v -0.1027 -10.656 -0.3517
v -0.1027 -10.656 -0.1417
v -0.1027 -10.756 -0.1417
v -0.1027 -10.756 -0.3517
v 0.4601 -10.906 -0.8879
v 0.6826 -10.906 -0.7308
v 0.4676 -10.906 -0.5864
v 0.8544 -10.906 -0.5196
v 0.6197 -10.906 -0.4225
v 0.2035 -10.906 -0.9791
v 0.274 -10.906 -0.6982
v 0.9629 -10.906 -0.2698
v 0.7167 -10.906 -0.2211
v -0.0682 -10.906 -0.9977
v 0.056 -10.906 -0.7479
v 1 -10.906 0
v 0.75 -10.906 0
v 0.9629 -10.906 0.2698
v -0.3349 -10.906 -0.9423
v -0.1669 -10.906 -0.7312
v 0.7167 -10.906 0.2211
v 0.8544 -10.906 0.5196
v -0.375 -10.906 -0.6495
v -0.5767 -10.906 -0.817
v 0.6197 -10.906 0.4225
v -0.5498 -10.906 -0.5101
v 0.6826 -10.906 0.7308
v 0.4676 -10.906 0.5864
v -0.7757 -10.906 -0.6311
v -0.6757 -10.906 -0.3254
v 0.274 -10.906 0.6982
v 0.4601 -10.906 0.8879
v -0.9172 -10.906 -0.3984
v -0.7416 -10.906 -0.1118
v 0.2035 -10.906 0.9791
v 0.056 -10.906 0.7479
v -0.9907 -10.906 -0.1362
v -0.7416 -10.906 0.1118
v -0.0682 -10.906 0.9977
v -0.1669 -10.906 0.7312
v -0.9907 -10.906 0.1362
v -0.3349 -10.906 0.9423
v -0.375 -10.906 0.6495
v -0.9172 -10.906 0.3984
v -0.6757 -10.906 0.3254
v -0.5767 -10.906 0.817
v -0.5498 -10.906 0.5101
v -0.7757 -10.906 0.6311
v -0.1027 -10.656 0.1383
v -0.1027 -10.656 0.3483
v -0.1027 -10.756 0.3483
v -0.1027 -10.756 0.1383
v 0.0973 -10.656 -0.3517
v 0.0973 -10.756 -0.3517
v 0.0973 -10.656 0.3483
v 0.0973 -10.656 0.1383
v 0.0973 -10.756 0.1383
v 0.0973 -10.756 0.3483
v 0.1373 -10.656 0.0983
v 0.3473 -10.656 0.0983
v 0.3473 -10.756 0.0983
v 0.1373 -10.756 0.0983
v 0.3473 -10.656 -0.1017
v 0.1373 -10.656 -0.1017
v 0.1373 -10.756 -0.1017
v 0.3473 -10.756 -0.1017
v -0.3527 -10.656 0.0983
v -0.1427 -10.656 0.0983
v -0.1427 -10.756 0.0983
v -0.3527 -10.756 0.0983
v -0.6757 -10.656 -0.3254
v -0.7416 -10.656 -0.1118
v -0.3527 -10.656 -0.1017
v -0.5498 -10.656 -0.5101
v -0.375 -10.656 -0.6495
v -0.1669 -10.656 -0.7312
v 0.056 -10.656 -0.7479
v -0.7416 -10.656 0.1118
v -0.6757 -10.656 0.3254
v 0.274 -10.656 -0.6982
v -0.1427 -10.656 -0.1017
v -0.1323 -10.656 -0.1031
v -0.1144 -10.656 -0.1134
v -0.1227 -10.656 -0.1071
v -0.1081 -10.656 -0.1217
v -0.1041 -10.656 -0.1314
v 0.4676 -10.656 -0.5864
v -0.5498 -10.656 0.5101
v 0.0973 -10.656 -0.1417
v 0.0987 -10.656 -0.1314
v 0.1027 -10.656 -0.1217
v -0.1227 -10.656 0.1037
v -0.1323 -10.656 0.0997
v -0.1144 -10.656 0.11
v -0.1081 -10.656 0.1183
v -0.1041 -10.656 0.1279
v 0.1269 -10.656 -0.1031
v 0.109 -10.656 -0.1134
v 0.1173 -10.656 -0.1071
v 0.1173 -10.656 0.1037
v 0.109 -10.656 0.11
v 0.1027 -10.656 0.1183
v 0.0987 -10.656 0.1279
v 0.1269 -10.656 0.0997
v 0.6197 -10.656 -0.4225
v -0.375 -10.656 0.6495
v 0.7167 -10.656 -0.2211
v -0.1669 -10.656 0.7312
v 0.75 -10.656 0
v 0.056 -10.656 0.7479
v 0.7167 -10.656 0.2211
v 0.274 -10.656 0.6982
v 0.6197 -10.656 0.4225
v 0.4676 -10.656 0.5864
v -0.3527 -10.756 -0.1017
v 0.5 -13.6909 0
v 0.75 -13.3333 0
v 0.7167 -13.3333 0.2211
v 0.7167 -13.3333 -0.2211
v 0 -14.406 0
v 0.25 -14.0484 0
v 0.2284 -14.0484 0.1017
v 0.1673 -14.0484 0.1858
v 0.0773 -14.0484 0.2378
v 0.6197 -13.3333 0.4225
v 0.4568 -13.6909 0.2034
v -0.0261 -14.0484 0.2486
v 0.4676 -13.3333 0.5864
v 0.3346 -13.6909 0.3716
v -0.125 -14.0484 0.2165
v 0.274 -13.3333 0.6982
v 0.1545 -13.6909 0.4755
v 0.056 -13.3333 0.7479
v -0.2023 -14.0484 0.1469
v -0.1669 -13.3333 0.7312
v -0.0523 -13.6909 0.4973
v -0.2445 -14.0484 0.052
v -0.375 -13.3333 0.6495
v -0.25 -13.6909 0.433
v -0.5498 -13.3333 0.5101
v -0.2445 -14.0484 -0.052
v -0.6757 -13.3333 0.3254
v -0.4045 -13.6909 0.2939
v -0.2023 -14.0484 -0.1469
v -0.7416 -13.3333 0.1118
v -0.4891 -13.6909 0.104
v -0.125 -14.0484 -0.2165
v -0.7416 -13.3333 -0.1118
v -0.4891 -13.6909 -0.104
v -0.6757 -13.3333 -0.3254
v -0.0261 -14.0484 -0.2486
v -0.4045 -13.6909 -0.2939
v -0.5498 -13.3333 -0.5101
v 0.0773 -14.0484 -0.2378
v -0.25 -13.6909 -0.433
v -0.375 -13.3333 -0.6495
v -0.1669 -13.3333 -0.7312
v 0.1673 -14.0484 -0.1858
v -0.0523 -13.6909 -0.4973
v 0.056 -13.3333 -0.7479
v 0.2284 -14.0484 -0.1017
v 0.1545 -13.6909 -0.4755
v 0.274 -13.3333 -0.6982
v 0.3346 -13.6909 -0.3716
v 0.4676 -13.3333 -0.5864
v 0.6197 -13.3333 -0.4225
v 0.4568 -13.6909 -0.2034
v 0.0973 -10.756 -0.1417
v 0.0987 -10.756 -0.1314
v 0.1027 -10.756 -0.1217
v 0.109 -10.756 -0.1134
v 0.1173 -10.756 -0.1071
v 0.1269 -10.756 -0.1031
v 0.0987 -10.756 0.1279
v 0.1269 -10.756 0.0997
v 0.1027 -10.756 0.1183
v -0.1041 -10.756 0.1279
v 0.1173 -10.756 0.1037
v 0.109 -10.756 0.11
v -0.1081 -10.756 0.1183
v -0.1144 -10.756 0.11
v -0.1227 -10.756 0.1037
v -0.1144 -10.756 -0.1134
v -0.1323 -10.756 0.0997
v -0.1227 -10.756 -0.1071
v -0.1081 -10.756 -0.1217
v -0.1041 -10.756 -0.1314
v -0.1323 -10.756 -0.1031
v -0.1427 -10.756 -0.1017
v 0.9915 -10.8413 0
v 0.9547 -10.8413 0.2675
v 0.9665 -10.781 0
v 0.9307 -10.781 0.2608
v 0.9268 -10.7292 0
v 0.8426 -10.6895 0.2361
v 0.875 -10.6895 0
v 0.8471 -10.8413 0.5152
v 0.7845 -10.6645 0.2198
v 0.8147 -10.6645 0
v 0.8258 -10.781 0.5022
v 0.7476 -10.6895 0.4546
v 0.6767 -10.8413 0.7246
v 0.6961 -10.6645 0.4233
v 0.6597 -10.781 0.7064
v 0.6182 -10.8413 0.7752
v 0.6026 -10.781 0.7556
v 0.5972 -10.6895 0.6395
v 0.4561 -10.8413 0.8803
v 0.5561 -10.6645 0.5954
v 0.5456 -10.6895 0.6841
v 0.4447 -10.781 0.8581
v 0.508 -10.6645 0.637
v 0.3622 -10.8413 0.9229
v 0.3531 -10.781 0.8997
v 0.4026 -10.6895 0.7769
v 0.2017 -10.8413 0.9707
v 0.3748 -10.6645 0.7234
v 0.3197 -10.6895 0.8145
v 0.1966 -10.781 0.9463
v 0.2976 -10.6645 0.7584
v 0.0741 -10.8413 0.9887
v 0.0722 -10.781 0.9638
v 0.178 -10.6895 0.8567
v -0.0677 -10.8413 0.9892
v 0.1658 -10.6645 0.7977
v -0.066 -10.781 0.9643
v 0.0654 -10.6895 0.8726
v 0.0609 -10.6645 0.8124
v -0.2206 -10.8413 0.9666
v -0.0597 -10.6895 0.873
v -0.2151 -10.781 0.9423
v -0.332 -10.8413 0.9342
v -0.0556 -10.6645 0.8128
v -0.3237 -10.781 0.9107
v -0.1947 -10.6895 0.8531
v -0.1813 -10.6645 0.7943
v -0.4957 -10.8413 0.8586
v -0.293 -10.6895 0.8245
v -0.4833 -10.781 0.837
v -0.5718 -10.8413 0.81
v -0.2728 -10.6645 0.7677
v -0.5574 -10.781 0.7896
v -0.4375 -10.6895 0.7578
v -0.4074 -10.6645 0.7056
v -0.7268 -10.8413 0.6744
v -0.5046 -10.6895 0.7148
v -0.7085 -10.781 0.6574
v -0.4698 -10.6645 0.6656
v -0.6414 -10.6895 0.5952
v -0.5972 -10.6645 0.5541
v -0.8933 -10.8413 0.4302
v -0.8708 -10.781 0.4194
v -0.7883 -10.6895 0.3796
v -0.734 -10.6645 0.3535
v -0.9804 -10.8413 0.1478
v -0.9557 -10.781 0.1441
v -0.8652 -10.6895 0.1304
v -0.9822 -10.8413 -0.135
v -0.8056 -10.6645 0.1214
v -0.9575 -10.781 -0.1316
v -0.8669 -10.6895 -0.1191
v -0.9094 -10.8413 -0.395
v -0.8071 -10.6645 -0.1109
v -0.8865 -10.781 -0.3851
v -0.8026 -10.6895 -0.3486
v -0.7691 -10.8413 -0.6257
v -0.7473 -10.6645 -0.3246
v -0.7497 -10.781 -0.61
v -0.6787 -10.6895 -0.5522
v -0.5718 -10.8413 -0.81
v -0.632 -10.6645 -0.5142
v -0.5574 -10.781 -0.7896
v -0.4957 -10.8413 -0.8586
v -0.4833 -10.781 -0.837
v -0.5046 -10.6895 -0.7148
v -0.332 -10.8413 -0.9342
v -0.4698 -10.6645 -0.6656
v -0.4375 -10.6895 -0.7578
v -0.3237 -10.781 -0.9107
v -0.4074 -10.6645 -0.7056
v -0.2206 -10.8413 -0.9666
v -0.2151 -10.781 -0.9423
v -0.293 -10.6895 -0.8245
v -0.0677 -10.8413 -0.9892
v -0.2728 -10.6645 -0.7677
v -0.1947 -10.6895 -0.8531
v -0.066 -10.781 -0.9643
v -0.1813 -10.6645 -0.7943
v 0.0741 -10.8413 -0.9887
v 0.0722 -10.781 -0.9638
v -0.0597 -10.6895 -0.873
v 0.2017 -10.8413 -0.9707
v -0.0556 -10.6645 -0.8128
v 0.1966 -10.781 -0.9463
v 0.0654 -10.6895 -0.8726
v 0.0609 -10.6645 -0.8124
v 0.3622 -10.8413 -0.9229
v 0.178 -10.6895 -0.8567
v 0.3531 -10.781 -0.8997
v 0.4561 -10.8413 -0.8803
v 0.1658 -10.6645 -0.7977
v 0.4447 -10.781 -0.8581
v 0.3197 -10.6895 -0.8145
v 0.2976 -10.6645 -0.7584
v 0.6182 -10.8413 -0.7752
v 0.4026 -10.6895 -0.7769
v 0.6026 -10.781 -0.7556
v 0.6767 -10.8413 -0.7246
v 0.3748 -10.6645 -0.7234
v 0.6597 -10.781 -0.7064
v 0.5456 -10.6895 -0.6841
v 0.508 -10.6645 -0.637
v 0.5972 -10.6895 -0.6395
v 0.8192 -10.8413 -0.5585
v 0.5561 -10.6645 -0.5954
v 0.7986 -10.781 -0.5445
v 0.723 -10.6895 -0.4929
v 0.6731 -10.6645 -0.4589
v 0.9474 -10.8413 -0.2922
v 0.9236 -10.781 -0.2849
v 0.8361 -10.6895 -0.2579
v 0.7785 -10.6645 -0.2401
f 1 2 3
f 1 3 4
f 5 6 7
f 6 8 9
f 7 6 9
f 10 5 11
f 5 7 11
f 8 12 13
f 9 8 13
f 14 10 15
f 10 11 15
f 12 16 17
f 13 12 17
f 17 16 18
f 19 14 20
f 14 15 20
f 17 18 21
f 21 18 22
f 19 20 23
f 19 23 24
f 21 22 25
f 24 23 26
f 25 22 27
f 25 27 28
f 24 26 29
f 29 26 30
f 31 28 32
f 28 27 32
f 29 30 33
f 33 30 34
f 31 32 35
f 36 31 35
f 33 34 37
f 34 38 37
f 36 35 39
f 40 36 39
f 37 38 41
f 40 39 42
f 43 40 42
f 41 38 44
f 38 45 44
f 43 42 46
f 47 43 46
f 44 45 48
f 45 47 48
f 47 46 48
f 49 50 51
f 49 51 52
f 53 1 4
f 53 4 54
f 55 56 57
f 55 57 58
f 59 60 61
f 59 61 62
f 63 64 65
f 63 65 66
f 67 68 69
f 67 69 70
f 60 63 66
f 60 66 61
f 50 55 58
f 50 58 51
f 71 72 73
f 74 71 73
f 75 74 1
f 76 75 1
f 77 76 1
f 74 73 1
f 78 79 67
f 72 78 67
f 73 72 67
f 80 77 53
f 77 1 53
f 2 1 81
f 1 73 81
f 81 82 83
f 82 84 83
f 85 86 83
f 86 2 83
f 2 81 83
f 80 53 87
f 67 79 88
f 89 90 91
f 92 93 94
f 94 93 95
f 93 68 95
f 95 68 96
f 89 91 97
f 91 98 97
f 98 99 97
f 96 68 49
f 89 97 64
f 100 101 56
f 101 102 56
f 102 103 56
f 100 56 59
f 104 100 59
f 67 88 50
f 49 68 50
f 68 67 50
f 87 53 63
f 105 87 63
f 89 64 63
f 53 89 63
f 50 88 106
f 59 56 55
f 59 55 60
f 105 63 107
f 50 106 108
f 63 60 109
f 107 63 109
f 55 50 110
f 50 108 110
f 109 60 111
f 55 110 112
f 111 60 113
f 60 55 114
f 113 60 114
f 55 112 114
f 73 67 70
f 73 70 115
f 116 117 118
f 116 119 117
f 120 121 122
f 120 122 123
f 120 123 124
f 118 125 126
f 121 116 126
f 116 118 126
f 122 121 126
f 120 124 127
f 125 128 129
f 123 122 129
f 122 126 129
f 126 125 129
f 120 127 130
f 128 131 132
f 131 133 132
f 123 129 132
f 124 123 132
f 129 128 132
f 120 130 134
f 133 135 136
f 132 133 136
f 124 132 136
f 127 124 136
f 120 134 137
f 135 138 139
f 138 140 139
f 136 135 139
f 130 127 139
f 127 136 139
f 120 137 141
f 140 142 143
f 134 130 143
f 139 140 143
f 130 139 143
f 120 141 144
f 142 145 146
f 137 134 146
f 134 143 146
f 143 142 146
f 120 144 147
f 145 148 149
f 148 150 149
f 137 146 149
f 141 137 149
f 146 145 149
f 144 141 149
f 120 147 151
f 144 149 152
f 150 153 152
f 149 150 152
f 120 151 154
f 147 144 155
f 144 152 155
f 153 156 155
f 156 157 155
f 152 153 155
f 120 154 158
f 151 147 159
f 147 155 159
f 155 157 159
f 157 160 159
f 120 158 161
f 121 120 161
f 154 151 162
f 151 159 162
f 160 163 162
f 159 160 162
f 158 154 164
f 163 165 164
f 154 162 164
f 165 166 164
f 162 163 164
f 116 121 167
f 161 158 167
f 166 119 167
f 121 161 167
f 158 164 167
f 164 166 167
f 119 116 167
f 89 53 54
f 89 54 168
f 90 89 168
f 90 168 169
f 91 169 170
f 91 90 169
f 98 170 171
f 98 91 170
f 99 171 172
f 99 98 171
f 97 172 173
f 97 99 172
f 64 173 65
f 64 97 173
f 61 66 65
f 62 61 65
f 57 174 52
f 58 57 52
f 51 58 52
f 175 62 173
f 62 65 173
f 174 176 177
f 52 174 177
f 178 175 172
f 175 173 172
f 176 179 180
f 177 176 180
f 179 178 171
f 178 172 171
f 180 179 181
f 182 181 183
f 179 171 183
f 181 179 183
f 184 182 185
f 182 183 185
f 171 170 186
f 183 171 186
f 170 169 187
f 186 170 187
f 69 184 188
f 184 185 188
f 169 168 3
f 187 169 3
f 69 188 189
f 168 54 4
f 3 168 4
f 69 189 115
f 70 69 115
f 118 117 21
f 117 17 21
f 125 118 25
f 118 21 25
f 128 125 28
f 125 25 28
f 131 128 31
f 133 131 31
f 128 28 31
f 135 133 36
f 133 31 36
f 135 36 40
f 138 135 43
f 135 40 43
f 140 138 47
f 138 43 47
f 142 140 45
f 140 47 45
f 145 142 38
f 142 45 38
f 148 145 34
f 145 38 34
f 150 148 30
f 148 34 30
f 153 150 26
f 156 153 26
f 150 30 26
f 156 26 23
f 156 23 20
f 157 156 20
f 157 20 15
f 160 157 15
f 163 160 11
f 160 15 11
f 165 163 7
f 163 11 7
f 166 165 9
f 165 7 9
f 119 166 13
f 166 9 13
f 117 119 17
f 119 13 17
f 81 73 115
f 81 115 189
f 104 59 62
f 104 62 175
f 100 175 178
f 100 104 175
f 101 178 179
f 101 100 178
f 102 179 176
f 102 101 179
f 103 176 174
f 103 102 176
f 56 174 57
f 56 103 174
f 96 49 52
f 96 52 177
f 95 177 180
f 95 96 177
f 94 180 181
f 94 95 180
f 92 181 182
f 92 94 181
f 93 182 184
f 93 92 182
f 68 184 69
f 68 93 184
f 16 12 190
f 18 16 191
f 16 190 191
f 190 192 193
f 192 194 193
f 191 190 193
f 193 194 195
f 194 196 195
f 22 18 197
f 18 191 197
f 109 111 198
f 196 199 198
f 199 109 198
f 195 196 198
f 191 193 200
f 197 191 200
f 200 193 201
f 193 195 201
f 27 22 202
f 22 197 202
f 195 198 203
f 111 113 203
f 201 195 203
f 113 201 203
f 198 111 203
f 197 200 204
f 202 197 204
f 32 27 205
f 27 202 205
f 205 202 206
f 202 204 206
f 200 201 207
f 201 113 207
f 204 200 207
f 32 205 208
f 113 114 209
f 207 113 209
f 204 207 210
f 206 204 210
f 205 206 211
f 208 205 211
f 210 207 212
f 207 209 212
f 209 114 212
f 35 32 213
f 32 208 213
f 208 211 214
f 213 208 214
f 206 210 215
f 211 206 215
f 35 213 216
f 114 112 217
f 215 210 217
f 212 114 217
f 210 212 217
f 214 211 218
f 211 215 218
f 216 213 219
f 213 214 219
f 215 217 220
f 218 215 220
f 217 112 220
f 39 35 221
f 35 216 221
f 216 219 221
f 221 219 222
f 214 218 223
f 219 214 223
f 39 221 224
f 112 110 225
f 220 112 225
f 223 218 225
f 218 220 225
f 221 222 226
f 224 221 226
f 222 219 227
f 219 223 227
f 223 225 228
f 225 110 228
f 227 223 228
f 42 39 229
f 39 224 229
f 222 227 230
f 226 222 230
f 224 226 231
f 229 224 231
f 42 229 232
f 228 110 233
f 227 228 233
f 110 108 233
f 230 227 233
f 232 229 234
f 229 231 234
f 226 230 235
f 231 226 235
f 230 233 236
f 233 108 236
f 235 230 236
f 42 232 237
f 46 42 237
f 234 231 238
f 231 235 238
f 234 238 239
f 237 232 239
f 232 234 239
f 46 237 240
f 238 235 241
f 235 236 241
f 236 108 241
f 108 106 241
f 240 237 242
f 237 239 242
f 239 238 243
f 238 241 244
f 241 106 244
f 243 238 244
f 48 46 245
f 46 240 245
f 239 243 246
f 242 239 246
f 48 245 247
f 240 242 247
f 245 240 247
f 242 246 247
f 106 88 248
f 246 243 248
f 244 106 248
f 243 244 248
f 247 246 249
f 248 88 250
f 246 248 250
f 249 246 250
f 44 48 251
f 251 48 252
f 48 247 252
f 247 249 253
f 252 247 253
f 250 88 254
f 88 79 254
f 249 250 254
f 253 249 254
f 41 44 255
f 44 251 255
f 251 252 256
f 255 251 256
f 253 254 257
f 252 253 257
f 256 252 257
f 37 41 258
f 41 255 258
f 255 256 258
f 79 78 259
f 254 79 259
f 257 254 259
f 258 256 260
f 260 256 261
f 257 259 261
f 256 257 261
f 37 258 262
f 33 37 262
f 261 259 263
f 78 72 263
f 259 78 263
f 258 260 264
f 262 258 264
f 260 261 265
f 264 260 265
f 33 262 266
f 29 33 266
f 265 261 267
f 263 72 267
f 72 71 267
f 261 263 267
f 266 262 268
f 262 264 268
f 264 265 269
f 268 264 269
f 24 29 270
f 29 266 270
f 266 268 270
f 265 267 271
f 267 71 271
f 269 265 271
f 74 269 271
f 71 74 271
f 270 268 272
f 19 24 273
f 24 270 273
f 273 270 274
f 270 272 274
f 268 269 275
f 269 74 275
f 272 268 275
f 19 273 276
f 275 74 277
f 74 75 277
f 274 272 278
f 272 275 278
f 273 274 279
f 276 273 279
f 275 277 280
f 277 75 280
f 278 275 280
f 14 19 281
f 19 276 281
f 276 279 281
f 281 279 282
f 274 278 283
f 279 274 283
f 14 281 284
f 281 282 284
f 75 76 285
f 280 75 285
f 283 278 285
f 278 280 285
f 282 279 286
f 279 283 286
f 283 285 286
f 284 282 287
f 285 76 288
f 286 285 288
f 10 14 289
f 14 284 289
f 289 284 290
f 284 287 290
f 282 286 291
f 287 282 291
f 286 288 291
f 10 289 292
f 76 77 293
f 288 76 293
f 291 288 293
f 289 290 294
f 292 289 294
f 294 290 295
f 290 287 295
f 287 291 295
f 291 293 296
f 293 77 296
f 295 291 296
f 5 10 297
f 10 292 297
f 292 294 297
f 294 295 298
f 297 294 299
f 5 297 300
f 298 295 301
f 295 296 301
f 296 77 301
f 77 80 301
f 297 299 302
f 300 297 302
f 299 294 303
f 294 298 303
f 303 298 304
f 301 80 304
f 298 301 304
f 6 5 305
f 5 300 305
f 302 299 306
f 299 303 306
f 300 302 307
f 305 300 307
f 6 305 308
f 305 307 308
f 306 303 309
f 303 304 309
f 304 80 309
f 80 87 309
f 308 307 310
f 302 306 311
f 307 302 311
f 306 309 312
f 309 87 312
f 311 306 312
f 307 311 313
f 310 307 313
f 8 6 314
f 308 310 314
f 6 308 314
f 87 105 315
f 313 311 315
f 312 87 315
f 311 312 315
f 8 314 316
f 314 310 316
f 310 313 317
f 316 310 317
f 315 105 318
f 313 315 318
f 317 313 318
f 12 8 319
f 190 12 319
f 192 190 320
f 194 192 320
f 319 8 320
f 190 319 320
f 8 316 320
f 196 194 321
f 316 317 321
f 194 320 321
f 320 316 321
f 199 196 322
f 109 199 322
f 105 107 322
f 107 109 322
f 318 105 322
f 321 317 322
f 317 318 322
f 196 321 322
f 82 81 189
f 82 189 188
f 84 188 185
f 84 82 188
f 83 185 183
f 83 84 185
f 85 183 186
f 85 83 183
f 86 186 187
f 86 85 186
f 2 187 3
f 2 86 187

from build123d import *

# Parameters (mm, degrees)
CUT_EXTRUDE1_DEPTH = 0.1


with BuildPart() as part:
    # Sketch1 → Revolve1 (revolve)
    with BuildSketch(Plane.XY):
        with BuildLine():
            Line((0, -10.655976488), (0, -14.405976488))
            Line((0, -14.405976488), (0.75, -13.333296431))
            Line((0.75, -13.333296431), (0.75, -10.905976488))
            Line((0.75, -10.905976488), (1, -10.905976488))
            ThreePointArc((1, -10.905976488), (0.926776695, -10.729199793), (0.75, -10.655976488))
            Line((0.75, -10.655976488), (0, -10.655976488))
        make_face()
    revolve(axis=Axis((0, -10.655976488, 0), (0, -1, 0)))

    # Sketch2 → Cut-Extrude1 (cut)
    with BuildSketch(Plane(origin=(0, -10.655976488, 0), x_dir=(1, 0, 0), z_dir=(0, 1, 0))):
        with BuildLine():
            Line((-0.102700854, 0.351707003), (0.097299146, 0.351707003))
            Line((0.097299146, 0.351707003), (0.097299146, 0.141707003))
            ThreePointArc((0.097299146, 0.141707003), (0.109014874, 0.113422731), (0.137299146, 0.101707003))
            Line((0.137299146, 0.101707003), (0.347299146, 0.101707003))
            Line((0.347299146, 0.101707003), (0.347299146, -0.098292997))
            Line((0.347299146, -0.098292997), (0.137299146, -0.098292997))
            ThreePointArc((0.137299146, -0.098292997), (0.109014874, -0.110008726), (0.097299146, -0.138292997))
            Line((0.097299146, -0.138292997), (0.097299146, -0.348292997))
            Line((0.097299146, -0.348292997), (-0.102700854, -0.348292997))
            Line((-0.102700854, -0.348292997), (-0.102700854, -0.138292997))
            ThreePointArc((-0.102700854, -0.138292997), (-0.114416583, -0.110008726), (-0.142700854, -0.098292997))
            Line((-0.142700854, -0.098292997), (-0.352700854, -0.098292997))
            Line((-0.352700854, -0.098292997), (-0.352700854, 0.101707003))
            Line((-0.352700854, 0.101707003), (-0.142700854, 0.101707003))
            ThreePointArc((-0.142700854, 0.101707003), (-0.114416583, 0.113422731), (-0.102700854, 0.141707003))
            Line((-0.102700854, 0.141707003), (-0.102700854, 0.351707003))
        make_face()
    extrude(amount=-CUT_EXTRUDE1_DEPTH, mode=Mode.SUBTRACT)


solid = part.part
